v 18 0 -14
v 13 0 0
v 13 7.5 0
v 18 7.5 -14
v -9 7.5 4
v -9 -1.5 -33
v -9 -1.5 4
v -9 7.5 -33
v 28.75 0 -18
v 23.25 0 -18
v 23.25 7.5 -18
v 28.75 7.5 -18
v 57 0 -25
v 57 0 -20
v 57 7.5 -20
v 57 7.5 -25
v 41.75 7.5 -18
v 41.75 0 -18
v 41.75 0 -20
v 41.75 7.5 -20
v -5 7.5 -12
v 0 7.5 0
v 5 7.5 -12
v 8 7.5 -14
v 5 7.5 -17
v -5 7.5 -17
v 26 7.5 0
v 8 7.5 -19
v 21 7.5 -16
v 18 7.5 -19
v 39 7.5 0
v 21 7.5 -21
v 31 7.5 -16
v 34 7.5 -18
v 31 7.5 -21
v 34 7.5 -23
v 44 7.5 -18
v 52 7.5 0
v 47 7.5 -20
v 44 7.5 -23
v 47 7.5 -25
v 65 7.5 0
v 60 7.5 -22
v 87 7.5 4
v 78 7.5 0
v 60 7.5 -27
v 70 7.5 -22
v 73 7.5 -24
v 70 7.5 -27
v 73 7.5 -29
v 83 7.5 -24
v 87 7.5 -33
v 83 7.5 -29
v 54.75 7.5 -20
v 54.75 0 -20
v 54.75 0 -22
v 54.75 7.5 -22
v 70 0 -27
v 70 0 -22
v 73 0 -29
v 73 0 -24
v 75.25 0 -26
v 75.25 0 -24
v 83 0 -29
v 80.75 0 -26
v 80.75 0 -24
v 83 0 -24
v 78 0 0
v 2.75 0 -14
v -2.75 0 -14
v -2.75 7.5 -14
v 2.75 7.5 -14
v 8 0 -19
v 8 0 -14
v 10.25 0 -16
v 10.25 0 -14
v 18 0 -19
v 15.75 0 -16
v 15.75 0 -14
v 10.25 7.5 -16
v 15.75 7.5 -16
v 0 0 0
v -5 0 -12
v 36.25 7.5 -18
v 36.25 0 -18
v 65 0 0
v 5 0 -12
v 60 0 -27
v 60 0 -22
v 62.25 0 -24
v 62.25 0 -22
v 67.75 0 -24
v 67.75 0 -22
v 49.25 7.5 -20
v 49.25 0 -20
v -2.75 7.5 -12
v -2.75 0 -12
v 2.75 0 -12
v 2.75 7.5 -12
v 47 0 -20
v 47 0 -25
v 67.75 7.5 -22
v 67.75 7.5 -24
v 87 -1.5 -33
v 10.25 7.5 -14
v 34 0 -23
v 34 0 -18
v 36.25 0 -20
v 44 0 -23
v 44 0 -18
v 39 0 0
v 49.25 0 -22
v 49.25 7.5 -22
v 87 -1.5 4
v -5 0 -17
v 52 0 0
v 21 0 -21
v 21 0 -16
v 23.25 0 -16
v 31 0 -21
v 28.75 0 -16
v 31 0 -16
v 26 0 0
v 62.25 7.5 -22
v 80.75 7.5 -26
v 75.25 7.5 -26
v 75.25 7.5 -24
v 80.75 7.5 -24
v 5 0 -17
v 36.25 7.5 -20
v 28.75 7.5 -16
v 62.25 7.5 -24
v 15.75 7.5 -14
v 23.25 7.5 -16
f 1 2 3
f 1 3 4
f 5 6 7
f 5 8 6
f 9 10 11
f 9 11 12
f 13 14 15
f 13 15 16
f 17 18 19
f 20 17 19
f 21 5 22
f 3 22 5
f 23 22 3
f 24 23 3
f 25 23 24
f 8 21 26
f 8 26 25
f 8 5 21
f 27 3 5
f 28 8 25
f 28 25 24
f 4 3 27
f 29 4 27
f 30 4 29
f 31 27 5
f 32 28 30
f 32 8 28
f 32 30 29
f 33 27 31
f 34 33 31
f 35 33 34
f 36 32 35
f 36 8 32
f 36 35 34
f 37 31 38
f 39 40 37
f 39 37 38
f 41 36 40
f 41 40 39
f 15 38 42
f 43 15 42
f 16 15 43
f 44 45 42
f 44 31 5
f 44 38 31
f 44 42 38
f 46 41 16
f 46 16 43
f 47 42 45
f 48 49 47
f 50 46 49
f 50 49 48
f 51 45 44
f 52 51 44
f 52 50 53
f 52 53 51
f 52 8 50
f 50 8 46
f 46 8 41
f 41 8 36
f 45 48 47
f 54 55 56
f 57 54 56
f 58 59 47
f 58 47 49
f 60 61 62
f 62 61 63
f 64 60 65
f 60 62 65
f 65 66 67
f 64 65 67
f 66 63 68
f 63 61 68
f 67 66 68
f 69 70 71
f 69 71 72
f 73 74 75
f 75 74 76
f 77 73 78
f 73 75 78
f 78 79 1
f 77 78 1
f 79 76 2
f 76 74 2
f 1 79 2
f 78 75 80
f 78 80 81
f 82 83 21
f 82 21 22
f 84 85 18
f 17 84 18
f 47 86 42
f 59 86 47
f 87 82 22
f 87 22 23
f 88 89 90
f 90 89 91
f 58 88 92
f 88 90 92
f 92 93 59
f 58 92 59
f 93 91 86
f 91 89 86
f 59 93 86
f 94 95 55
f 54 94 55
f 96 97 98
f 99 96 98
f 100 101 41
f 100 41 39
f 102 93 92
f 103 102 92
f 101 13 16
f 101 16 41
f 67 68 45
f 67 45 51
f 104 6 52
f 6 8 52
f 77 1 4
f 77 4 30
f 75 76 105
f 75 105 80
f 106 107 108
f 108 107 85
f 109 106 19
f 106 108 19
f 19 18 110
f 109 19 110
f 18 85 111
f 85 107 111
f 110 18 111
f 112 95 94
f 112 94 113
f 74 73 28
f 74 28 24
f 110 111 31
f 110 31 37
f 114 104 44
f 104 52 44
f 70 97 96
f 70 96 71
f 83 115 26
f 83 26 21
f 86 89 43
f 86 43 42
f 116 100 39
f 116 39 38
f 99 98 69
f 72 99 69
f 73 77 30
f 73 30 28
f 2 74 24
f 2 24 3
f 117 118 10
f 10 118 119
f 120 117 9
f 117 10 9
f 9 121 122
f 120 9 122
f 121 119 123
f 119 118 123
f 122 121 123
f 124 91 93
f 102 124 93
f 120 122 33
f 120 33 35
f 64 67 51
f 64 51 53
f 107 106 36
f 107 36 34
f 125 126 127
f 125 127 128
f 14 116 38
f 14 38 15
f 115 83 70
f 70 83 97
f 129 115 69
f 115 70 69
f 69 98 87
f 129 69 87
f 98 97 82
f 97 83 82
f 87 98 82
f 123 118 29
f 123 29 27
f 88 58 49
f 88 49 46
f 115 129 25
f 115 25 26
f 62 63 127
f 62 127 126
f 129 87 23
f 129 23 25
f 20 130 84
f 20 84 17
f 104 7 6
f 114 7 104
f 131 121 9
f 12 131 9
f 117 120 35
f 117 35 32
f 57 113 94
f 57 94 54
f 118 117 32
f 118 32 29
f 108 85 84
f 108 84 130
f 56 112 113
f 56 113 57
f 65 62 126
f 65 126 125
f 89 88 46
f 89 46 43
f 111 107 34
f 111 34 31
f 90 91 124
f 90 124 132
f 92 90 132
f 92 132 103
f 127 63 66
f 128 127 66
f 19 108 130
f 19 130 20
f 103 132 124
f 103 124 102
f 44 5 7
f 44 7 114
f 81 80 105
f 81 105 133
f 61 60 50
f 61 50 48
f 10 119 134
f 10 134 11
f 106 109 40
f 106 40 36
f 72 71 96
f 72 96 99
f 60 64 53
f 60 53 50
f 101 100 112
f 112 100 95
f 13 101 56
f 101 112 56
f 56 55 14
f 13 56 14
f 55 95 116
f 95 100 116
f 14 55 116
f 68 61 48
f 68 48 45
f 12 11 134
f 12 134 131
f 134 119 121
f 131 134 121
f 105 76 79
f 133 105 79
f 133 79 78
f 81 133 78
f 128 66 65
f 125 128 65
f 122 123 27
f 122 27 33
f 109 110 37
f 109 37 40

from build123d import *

# Parameters (mm, degrees)
FLAPS_W               = 96
FLAPS_H               = 37
BOSS_EXTRUDE1_DEPTH   = 7.5
FLAPS_W_2             = 5.5
FLAPS_H_2             = 2
BOSS_EXTRUDE1_2_DEPTH = 7.5
BOSS_EXTRUDE1_3_DEPTH = 7.5
BOSS_EXTRUDE1_4_DEPTH = 7.5
BOSS_EXTRUDE1_5_DEPTH = 7.5
BOSS_EXTRUDE1_6_DEPTH = 7.5
BOSS_EXTRUDE1_7_DEPTH = 7.5
BOSS_EXTRUDE1_8_DEPTH = 7.5
SKETCH2_W             = 96
SKETCH2_H             = 37
BOSS_EXTRUDE2_DEPTH   = 1.5


with BuildPart() as part:
    # Flaps → Boss-Extrude1 (new body)
    with BuildSketch(Plane(origin=(0, 0, 0), x_dir=(1, 0, 0), z_dir=(0, 1, 0))):
        with Locations((39, 14.5)):
            Rectangle(FLAPS_W, FLAPS_H)
        Polygon((78, 0), (83, 24), (83, 29), (73, 29), (73, 24), align=None, mode=Mode.SUBTRACT)
        Polygon((65, 0), (70, 22), (70, 27), (60, 27), (60, 22), align=None, mode=Mode.SUBTRACT)
        Polygon((52, 0), (57, 20), (57, 25), (47, 25), (47, 20), align=None, mode=Mode.SUBTRACT)
        Polygon((39, 0), (44, 18), (44, 23), (34, 23), (34, 18), align=None, mode=Mode.SUBTRACT)
        Polygon((26, 0), (31, 16), (31, 21), (21, 21), (21, 16), align=None, mode=Mode.SUBTRACT)
        Polygon((13, 0), (18, 14), (18, 19), (8, 19), (8, 14), align=None, mode=Mode.SUBTRACT)
        Polygon((0, 0), (5, 12), (5, 17), (-5, 17), (-5, 12), align=None, mode=Mode.SUBTRACT)
    extrude(amount=BOSS_EXTRUDE1_DEPTH)



with BuildPart() as body_2:
    # Flaps → Boss-Extrude1 2 (new body)
    with BuildSketch(Plane(origin=(0, 0, 0), x_dir=(1, 0, 0), z_dir=(0, 1, 0))):
        with Locations((0, 13)):
            Rectangle(FLAPS_W_2, FLAPS_H_2)
    extrude(amount=BOSS_EXTRUDE1_2_DEPTH)


with BuildPart() as body_3:
    # Flaps → Boss-Extrude1 3 (new body)
    with BuildSketch(Plane(origin=(0, 0, 0), x_dir=(1, 0, 0), z_dir=(0, 1, 0))):
        with Locations((13, 15)):
            Rectangle(FLAPS_W_2, FLAPS_H_2)
    extrude(amount=BOSS_EXTRUDE1_3_DEPTH)


with BuildPart() as body_4:
    # Flaps → Boss-Extrude1 4 (new body)
    with BuildSketch(Plane(origin=(0, 0, 0), x_dir=(1, 0, 0), z_dir=(0, 1, 0))):
        with Locations((26, 17)):
            Rectangle(FLAPS_W_2, FLAPS_H_2)
    extrude(amount=BOSS_EXTRUDE1_4_DEPTH)


with BuildPart() as body_5:
    # Flaps → Boss-Extrude1 5 (new body)
    with BuildSketch(Plane(origin=(0, 0, 0), x_dir=(1, 0, 0), z_dir=(0, 1, 0))):
        with Locations((39, 19)):
            Rectangle(FLAPS_W_2, FLAPS_H_2)
    extrude(amount=BOSS_EXTRUDE1_5_DEPTH)


with BuildPart() as body_6:
    # Flaps → Boss-Extrude1 6 (new body)
    with BuildSketch(Plane(origin=(0, 0, 0), x_dir=(1, 0, 0), z_dir=(0, 1, 0))):
        with Locations((52, 21)):
            Rectangle(FLAPS_W_2, FLAPS_H_2)
    extrude(amount=BOSS_EXTRUDE1_6_DEPTH)


with BuildPart() as body_7:
    # Flaps → Boss-Extrude1 7 (new body)
    with BuildSketch(Plane(origin=(0, 0, 0), x_dir=(1, 0, 0), z_dir=(0, 1, 0))):
        with Locations((65, 23)):
            Rectangle(FLAPS_W_2, FLAPS_H_2)
    extrude(amount=BOSS_EXTRUDE1_7_DEPTH)


with BuildPart() as body_8:
    # Flaps → Boss-Extrude1 8 (new body)
    with BuildSketch(Plane(origin=(0, 0, 0), x_dir=(1, 0, 0), z_dir=(0, 1, 0))):
        with Locations((78, 25)):
            Rectangle(FLAPS_W_2, FLAPS_H_2)
    extrude(amount=BOSS_EXTRUDE1_8_DEPTH)


with BuildPart() as part_1:
    add(part.part)

    add(body_2.part)  # Boss-Extrude2 merges body 2

    add(body_3.part)  # Boss-Extrude2 merges body 3

    add(body_4.part)  # Boss-Extrude2 merges body 4

    add(body_5.part)  # Boss-Extrude2 merges body 5

    add(body_6.part)  # Boss-Extrude2 merges body 6

    add(body_7.part)  # Boss-Extrude2 merges body 7

    add(body_8.part)  # Boss-Extrude2 merges body 8
    # Sketch2 → Boss-Extrude2 (add)
    with BuildSketch(Plane.XZ):
        with Locations((39, -14.5)):
            Rectangle(SKETCH2_W, SKETCH2_H)
    extrude(amount=BOSS_EXTRUDE2_DEPTH)


solid = part_1.part
